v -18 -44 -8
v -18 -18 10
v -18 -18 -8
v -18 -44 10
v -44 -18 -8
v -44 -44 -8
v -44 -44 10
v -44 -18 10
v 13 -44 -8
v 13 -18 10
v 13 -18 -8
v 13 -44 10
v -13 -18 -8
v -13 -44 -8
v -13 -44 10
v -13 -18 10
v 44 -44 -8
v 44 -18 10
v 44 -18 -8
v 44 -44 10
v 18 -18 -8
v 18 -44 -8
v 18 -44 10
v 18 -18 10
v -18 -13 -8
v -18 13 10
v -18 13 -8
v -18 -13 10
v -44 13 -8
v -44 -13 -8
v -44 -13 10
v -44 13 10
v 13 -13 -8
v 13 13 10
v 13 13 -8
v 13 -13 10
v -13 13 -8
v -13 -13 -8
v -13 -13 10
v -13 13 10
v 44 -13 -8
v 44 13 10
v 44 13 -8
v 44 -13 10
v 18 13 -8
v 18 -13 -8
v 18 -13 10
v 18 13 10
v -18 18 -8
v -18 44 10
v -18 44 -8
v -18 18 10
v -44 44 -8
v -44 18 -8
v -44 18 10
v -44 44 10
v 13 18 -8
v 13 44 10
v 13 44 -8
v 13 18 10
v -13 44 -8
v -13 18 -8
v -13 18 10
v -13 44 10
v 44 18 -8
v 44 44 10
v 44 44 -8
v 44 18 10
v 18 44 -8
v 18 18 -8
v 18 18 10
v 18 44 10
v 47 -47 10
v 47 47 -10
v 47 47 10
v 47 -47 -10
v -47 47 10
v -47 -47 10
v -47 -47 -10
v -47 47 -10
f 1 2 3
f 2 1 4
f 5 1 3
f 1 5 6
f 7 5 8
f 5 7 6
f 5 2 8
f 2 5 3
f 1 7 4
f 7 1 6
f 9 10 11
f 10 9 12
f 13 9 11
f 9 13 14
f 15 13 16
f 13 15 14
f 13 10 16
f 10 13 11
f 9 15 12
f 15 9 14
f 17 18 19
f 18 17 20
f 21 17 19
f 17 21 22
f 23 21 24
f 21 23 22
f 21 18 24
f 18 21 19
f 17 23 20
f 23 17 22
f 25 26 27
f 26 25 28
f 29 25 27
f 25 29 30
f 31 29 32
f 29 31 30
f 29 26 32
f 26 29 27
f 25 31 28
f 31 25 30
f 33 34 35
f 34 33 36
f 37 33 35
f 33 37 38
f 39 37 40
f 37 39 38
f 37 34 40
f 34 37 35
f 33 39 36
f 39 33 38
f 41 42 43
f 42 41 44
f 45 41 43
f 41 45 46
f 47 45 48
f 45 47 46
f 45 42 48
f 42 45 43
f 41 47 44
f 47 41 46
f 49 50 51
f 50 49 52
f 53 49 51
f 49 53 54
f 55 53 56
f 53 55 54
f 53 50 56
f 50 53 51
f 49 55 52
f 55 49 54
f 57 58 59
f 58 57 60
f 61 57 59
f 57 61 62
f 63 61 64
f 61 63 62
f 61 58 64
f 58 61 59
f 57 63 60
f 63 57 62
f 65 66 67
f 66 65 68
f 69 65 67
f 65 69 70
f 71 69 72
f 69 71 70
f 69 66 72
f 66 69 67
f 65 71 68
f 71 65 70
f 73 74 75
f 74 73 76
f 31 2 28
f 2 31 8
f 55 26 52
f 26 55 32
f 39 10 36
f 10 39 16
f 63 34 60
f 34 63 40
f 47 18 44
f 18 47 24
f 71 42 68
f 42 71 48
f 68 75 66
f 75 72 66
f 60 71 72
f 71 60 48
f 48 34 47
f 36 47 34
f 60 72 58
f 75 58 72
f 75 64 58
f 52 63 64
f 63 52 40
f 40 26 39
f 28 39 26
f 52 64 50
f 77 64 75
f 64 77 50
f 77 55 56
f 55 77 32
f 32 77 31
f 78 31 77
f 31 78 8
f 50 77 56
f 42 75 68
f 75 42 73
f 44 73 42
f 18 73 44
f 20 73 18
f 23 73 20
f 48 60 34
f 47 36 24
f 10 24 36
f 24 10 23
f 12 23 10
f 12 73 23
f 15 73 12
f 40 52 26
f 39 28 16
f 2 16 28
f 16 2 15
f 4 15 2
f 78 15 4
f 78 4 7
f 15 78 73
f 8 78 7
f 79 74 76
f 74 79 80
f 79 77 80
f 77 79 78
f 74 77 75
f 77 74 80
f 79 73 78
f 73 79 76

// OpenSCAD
$fn = 32;

// ----------------------------------------------------------------------
// Pocket plate 94 x 94 x 20
// 3 x 3 pockets 26 mm square, 18 mm deep
// ----------------------------------------------------------------------

// --- parameters (mm) ---
thickness = 20;  // plate thickness
floor_t = 2;     // material left under each pocket
pocket = 26;     // pocket side length
pitch_x = 31;    // pocket pitch along X
pitch_y = 31;    // pocket pitch along Y
cols = 3;        // pockets per row
rows = 3;        // rows of pockets

// --- derived feature positions (mm) ---
depth = thickness - floor_t;        // = 18   pocket depth, down to the floor
span_x = (cols - 1) * pitch_x;      // = 62   distance between outer pockets
span_y = (rows - 1) * pitch_y;      // = 62   distance between outer pocket rows
origin_x = -span_x / 2;             // = -31   X of the first pocket
origin_y = -span_y / 2;             // = -31   Y of the first pocket
plate = [span_x + pocket + 6, span_y + pocket + 6, thickness];  // = [94, 94, 20]   overall size: pockets plus 3 mm of wall on each side
feature_centers = [
  [origin_x + 0 * pitch_x, origin_y + 0 * pitch_y],
  [origin_x + 1 * pitch_x, origin_y + 0 * pitch_y],
  [origin_x + 2 * pitch_x, origin_y + 0 * pitch_y],
  [origin_x + 0 * pitch_x, origin_y + 1 * pitch_y],
  [origin_x + 1 * pitch_x, origin_y + 1 * pitch_y],
  [origin_x + 2 * pitch_x, origin_y + 1 * pitch_y],
  [origin_x + 0 * pitch_x, origin_y + 2 * pitch_y],
  [origin_x + 1 * pitch_x, origin_y + 2 * pitch_y],
  [origin_x + 2 * pitch_x, origin_y + 2 * pitch_y]
];   // pocket centres, used verbatim by the cutter loop

// plate outline, then one pocket per centre in feature_centers
difference() {
  cube(plate, center = true);
  for (centre = feature_centers)
    translate([centre[0] - pocket / 2, centre[1] - pocket / 2, plate[2] / 2 - depth])
      cube([pocket, pocket, depth + 1]);  // centred on the declared pocket centre
}
